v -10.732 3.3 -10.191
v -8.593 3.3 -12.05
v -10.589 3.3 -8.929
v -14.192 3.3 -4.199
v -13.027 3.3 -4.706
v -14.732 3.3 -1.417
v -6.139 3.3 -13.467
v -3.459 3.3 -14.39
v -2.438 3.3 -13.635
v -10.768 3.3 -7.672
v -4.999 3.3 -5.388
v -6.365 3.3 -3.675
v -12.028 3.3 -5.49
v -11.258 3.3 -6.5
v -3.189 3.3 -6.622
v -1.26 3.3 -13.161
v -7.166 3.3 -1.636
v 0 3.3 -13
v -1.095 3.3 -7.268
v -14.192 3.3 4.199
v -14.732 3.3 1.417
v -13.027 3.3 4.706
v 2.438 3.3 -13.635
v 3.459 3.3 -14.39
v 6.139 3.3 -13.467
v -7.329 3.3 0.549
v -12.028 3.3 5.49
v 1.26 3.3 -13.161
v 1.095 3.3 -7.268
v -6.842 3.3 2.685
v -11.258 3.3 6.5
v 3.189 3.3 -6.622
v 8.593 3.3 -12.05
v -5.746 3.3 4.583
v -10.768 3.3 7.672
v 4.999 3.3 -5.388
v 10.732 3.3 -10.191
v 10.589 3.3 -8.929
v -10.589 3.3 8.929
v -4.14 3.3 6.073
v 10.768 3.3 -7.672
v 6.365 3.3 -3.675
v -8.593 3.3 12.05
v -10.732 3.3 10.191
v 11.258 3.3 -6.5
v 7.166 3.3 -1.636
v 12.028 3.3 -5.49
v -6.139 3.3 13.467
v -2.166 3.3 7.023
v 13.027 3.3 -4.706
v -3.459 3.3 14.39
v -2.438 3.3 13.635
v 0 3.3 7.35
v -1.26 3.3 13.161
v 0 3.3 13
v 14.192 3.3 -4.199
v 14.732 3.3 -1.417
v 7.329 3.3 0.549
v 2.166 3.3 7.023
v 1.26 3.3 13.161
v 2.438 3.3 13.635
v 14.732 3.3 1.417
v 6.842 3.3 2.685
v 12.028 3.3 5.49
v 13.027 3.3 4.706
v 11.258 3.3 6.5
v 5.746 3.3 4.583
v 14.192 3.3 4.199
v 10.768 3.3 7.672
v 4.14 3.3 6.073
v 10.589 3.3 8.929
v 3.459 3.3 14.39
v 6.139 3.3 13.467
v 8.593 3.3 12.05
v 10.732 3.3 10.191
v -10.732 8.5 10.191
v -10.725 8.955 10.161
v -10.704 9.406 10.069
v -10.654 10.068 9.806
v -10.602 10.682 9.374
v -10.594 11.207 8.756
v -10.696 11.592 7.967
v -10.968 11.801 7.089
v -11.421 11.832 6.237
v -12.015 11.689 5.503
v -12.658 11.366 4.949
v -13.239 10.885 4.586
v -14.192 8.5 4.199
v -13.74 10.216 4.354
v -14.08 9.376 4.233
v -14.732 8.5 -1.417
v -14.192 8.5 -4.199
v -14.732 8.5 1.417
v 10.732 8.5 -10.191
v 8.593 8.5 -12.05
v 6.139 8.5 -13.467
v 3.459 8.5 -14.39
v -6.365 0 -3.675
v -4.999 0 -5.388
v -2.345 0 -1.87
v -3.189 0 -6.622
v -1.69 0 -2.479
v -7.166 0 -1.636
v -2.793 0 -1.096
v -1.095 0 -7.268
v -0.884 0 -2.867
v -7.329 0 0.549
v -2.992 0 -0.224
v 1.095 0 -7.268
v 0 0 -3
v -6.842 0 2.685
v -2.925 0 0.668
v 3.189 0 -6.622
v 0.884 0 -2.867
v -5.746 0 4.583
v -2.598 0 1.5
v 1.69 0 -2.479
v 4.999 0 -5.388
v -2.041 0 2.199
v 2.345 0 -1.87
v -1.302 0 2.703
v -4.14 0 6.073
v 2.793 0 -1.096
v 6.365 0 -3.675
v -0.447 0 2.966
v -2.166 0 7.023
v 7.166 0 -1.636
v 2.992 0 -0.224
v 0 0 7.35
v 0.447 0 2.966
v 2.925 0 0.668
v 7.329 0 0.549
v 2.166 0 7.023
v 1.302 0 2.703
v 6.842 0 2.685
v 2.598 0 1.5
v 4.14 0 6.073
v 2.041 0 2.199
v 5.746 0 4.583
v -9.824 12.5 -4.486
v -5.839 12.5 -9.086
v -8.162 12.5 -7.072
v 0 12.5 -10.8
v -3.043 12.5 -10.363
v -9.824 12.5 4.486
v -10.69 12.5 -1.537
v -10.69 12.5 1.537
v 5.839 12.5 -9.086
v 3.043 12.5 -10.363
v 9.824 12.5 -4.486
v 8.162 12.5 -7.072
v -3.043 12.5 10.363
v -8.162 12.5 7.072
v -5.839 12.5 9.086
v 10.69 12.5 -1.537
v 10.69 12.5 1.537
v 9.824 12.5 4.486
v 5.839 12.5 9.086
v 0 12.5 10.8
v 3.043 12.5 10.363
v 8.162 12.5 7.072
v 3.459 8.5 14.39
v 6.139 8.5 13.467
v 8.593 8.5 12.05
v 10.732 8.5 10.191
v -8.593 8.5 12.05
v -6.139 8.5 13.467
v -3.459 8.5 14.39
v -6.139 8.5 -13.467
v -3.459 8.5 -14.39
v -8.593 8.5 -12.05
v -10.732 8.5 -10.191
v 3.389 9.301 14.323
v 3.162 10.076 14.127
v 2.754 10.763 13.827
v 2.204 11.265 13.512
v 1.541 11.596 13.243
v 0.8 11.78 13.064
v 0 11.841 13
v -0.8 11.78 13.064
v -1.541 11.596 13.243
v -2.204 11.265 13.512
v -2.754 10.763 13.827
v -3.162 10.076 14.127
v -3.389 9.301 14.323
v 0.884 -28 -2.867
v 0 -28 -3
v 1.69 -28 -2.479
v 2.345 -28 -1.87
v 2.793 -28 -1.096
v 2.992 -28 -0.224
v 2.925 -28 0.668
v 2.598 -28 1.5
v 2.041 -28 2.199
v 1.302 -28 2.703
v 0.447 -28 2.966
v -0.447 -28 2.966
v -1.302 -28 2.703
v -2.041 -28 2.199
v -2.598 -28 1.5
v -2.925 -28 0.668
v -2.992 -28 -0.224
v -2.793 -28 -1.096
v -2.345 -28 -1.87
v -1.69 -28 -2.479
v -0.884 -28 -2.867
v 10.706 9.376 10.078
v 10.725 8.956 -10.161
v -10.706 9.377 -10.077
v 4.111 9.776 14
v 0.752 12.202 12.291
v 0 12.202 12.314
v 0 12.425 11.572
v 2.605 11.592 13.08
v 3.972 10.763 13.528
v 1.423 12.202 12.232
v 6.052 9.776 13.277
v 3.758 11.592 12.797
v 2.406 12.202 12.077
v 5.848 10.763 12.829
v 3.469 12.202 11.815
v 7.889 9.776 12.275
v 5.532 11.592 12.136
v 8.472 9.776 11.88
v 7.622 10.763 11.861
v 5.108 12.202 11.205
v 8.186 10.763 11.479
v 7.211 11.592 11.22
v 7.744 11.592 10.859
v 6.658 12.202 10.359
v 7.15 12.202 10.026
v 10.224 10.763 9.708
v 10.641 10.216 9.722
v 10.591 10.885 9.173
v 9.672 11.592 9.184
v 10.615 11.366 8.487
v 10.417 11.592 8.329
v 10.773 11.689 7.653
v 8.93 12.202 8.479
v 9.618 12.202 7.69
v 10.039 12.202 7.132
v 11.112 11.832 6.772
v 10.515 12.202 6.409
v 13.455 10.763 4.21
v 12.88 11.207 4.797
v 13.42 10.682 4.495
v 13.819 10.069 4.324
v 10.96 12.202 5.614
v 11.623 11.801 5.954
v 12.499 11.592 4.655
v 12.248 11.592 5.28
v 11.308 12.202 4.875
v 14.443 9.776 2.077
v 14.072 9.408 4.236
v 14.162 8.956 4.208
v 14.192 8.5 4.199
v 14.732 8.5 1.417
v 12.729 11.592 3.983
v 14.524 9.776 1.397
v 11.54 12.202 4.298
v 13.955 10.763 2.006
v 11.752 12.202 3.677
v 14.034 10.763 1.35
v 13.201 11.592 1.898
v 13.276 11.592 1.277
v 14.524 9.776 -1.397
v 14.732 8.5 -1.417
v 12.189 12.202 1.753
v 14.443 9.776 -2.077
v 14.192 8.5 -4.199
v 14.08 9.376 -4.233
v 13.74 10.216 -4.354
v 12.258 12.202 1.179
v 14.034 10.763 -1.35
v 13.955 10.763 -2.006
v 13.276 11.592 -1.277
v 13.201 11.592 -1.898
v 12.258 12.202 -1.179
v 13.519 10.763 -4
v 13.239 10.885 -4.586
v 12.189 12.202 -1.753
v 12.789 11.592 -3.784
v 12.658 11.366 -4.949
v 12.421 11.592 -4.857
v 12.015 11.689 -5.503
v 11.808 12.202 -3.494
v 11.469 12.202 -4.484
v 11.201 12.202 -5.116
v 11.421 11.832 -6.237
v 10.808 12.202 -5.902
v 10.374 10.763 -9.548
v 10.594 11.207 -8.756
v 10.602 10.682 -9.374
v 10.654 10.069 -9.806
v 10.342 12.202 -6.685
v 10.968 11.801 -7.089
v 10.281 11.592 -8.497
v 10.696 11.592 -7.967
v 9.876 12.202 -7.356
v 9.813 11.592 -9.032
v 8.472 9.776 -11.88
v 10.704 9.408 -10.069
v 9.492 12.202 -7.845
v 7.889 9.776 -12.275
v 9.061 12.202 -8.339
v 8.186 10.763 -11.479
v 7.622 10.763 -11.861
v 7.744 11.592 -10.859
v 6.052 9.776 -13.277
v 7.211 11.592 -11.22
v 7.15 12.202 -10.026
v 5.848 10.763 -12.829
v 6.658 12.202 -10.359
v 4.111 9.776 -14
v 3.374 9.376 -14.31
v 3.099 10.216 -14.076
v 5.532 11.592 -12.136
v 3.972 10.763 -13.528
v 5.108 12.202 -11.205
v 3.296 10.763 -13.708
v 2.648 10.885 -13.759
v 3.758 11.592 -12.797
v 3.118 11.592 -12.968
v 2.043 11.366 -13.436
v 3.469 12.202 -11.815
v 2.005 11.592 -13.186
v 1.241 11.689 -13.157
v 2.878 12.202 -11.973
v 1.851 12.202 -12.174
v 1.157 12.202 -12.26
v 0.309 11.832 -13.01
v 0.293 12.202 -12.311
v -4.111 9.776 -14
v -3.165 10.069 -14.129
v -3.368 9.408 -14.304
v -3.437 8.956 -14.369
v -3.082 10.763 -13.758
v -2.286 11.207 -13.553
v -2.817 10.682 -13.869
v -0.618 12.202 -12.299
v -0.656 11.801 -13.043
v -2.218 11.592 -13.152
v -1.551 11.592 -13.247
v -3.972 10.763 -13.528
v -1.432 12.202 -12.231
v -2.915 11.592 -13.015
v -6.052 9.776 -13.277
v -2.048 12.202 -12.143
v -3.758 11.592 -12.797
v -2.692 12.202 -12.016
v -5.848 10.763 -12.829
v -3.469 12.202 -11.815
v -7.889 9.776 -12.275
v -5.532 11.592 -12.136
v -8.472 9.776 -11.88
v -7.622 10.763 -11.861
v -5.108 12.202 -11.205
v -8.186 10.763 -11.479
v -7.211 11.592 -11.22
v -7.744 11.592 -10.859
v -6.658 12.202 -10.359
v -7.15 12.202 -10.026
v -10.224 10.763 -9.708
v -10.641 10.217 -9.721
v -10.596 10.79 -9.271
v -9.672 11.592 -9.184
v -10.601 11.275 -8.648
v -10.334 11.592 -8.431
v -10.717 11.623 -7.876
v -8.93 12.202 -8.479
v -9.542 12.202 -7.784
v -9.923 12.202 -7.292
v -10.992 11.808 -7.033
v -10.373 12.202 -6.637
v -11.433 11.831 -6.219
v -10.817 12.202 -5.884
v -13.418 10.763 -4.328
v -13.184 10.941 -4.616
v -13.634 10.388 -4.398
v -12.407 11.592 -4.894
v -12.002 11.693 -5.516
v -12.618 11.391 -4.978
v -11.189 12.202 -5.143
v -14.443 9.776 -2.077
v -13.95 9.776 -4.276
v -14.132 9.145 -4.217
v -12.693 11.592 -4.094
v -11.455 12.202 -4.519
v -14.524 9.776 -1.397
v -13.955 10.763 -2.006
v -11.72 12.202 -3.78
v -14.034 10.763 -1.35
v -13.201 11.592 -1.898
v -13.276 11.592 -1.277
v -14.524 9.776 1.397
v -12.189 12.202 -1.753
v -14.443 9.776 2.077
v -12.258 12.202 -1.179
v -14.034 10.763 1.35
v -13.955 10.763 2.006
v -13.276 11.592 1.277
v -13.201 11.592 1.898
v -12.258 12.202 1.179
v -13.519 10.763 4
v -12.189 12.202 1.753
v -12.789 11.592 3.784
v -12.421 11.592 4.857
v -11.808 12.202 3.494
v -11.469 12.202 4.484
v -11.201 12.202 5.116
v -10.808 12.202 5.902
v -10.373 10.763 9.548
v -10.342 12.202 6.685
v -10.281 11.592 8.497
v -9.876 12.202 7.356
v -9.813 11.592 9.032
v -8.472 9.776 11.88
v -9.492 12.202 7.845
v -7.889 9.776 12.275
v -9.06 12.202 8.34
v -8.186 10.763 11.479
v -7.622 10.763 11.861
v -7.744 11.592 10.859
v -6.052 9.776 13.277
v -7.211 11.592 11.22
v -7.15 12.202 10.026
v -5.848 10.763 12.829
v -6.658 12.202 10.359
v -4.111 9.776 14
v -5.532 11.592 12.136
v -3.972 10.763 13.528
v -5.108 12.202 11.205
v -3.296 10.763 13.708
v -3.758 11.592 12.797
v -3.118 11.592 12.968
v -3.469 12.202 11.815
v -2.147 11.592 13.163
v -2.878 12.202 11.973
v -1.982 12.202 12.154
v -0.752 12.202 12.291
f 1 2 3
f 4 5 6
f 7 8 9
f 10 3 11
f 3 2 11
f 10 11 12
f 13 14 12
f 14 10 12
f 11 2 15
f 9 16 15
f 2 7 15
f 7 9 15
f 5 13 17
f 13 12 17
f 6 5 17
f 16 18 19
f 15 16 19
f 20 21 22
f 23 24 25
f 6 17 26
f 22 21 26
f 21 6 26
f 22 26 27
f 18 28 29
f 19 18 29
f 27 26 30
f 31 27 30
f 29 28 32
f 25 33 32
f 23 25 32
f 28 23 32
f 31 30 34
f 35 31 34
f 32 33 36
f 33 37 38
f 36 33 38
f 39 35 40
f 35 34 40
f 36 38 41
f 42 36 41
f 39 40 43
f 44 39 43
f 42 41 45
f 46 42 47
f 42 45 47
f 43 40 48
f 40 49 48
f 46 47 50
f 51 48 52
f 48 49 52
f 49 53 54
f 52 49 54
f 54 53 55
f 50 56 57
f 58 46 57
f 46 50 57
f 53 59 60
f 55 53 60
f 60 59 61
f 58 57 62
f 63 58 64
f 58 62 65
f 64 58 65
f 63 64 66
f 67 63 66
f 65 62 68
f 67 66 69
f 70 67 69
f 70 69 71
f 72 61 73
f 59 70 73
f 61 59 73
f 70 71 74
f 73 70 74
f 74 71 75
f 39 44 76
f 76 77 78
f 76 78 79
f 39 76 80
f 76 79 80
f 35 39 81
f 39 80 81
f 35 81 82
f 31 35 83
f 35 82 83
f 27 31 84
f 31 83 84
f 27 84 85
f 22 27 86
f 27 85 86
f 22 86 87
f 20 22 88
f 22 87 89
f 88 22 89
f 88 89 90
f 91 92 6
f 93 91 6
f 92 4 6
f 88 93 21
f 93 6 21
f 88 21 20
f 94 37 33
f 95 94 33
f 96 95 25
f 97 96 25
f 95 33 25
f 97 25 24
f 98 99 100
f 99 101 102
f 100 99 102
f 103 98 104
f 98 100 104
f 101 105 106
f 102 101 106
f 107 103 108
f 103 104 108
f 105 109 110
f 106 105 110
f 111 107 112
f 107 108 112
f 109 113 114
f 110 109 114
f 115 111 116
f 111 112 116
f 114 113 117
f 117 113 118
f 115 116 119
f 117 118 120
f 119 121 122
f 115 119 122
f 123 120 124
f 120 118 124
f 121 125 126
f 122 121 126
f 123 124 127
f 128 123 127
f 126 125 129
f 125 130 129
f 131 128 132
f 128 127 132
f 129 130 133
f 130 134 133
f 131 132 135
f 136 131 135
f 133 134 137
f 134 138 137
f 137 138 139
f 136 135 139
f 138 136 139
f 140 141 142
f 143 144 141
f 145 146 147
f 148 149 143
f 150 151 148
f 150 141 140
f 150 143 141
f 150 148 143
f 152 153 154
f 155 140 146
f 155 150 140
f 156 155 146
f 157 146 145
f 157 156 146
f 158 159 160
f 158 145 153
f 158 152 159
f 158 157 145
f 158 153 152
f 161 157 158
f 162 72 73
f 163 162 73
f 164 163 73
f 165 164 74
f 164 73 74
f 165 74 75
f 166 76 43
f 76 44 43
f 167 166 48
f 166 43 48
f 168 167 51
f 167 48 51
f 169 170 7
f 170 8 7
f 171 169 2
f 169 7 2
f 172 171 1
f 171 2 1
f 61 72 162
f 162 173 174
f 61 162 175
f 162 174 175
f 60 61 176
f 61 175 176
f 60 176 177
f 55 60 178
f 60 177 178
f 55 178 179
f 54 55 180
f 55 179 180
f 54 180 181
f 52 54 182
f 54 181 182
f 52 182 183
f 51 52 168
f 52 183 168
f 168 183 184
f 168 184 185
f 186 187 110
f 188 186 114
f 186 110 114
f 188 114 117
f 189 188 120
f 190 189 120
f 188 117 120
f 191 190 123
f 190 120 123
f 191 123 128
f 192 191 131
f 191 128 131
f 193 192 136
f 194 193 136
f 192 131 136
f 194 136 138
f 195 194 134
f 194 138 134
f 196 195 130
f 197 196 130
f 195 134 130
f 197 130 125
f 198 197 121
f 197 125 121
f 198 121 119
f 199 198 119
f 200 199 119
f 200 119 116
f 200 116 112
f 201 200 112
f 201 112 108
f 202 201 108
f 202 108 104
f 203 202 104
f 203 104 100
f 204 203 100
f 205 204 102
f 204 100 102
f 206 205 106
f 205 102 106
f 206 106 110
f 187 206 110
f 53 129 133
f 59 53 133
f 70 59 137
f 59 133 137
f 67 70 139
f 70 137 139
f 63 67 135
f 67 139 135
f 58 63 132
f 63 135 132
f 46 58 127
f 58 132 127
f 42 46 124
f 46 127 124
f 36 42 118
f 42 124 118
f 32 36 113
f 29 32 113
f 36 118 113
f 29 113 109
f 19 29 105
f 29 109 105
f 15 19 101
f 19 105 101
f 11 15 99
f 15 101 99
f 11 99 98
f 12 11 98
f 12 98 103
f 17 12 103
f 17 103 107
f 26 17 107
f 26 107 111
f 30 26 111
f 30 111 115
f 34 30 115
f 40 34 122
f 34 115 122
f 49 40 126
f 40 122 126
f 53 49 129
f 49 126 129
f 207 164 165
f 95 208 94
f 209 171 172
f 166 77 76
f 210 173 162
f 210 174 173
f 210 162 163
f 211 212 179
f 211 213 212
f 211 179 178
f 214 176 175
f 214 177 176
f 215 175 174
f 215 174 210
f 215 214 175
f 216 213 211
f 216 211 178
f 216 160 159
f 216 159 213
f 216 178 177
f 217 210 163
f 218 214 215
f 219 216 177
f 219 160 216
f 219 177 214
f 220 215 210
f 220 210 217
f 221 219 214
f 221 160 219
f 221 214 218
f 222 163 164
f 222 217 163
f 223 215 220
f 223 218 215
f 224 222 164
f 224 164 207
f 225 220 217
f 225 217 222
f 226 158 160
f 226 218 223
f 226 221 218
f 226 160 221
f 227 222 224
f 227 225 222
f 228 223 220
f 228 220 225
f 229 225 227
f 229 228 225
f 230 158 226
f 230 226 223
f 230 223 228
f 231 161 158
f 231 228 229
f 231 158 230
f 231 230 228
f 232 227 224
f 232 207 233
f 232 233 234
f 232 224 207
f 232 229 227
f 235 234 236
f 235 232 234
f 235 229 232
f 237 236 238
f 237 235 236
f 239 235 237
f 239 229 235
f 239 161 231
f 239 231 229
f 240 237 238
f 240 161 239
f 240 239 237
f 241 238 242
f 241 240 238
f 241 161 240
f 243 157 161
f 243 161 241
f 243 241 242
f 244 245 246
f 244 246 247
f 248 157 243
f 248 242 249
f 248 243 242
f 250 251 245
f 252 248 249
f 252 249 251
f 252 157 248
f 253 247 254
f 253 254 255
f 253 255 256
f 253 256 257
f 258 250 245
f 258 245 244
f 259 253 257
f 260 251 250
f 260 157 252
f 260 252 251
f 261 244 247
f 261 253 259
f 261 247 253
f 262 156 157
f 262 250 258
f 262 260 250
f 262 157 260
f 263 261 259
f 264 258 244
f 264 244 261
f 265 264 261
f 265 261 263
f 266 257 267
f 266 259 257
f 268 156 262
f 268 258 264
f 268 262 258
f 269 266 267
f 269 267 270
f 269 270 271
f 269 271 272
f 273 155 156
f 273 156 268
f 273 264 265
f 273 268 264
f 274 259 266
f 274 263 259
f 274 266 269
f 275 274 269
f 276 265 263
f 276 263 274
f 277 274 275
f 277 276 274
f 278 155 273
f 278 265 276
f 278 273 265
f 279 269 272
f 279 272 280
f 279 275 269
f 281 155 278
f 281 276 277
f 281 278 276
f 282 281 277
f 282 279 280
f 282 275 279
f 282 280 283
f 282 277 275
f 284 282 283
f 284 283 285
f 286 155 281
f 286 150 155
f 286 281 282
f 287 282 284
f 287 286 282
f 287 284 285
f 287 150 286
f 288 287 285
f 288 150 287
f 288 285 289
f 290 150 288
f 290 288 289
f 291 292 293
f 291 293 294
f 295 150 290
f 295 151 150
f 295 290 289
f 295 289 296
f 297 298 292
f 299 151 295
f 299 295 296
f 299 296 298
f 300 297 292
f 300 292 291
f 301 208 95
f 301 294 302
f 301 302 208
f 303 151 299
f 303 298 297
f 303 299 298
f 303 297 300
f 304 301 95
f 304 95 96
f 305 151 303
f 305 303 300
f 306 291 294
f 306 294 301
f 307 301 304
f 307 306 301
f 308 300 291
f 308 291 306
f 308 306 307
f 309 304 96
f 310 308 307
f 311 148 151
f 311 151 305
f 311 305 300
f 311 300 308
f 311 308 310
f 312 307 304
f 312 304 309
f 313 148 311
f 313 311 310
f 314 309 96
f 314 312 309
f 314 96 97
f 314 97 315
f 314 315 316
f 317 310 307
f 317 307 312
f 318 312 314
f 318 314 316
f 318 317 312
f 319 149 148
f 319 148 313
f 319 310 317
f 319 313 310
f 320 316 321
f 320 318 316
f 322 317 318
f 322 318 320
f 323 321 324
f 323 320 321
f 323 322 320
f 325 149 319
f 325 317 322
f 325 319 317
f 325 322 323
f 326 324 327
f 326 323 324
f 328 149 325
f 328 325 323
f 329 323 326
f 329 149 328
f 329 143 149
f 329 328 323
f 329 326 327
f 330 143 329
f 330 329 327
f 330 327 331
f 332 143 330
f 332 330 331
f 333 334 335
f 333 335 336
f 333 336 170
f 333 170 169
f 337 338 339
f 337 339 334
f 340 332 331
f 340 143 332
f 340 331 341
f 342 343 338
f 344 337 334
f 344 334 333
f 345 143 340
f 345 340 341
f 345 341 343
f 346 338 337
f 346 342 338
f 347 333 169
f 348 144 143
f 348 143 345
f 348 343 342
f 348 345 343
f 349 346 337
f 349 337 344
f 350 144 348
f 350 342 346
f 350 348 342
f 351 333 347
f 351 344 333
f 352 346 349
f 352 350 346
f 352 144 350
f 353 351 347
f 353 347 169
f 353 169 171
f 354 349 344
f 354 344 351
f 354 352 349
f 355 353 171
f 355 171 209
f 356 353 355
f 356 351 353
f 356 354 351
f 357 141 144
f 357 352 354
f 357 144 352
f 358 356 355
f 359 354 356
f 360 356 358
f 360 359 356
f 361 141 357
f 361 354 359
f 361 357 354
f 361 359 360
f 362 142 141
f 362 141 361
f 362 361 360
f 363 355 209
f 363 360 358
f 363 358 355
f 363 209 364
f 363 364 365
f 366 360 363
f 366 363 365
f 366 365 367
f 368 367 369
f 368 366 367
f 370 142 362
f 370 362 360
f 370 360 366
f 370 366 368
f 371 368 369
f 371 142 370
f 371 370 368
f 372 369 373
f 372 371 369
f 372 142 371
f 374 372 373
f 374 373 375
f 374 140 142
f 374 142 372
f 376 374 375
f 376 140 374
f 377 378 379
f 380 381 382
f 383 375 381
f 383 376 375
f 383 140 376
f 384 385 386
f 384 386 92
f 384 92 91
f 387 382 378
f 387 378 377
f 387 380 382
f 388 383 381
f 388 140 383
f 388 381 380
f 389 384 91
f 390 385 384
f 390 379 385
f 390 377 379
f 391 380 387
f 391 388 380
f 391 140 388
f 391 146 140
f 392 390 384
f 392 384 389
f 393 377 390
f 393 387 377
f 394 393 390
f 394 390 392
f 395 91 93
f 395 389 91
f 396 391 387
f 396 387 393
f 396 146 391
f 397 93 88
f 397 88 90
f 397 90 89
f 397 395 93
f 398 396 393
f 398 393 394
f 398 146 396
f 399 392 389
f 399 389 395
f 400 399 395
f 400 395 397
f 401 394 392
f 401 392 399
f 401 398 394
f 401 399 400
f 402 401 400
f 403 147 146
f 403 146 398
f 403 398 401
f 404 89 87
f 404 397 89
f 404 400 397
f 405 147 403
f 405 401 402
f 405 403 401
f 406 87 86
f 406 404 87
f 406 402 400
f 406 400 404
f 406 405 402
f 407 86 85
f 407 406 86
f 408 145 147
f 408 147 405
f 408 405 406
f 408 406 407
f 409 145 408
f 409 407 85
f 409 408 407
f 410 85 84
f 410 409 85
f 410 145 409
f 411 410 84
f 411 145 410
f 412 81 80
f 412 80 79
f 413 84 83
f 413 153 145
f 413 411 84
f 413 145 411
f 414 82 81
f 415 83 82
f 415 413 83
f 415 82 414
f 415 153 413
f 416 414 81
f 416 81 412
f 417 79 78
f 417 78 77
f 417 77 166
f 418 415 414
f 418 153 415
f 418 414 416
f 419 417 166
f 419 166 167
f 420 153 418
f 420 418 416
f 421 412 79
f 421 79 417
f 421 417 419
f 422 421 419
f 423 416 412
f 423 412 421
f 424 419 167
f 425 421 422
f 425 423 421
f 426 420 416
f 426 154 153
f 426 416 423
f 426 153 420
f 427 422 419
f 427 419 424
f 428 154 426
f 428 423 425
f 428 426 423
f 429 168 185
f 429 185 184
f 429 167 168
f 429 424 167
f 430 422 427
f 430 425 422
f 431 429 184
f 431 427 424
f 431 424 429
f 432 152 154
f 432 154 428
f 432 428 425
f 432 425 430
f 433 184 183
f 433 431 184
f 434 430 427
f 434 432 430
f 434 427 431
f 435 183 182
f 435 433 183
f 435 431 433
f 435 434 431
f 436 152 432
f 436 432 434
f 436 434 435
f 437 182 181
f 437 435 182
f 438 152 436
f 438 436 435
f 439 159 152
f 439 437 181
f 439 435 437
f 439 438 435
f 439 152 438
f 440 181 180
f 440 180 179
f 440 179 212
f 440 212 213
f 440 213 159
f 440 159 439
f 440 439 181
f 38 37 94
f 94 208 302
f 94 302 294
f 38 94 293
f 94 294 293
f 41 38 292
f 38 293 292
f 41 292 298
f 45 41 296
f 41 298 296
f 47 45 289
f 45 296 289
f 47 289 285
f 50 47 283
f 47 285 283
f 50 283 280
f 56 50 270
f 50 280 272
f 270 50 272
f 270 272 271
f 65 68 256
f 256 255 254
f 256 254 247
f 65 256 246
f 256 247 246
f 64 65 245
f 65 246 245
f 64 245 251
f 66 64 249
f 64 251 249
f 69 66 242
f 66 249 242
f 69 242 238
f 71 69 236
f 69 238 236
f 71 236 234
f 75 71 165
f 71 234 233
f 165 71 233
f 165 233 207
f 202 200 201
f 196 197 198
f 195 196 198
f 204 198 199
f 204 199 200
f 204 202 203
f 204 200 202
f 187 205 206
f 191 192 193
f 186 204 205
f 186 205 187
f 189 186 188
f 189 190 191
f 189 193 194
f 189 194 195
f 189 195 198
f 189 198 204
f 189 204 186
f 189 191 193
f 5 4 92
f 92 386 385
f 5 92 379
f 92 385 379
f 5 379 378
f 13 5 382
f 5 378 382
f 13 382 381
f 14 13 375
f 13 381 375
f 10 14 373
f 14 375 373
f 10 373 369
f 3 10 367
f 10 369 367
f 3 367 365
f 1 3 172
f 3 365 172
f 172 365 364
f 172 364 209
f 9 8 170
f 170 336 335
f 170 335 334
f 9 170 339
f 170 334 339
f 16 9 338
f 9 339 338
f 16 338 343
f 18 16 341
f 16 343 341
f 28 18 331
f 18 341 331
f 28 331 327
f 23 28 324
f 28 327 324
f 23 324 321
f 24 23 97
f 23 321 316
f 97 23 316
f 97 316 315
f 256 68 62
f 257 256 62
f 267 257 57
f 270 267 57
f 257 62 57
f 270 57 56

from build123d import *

# Parameters (mm, degrees)
SKETCH_1_R          = 7.35
EXTRUDE_1_DEPTH     = 3.3
SKETCH_2_R          = 3
EXTRUDE_342_DEPTH   = 28
SKETCH_3_R          = 14.8
EXTRUDE_3_DEPTH     = 9.2
FILLET_1_R          = 4
SKETCH_4_R          = 5
CUT_EXTRUDE_1_DEPTH = 10


with BuildPart() as part:
    # Эскиз1 → Бобышка-Вытянуть1 (new body)
    with BuildSketch(Plane(origin=(0, 0, 0), x_dir=(1, 0, 0), z_dir=(0, 1, 0))):
        with Locations(Location((0, 0, 0), (0, 0, 270))):
            Circle(SKETCH_1_R)
    extrude(amount=EXTRUDE_1_DEPTH)

    # Эскиз2 → Extrude 342 (add)
    with BuildSketch(Plane.XZ):
        with Locations(Location((0, 0, 0), (0, 0, 270))):
            Circle(SKETCH_2_R)
    extrude(amount=EXTRUDE_342_DEPTH)

    # Эскиз3 → Бобышка-Вытянуть3 (add)
    with BuildSketch(Plane(origin=(0, 3.3, 0), x_dir=(1, 0, 0), z_dir=(0, 1, 0))):
        with Locations(Location((0, 0, 0), (0, 0, 270))):
            Circle(SKETCH_3_R)
    extrude(amount=EXTRUDE_3_DEPTH)

    # Скругление1
    fillet_1_edges = [part.edges().sort_by_distance(p)[0] for p in [
        (0, 12.5, -14.8),
    ]]
    fillet(fillet_1_edges, radius=FILLET_1_R)

    # Эскиз4 → Вырез-Вытянуть1 (cut)
    with BuildSketch(Plane(origin=(0, 12.5, 0), x_dir=(1, 0, 0), z_dir=(0, 1, 0))):
        with Locations((0, 18)):
            Circle(SKETCH_4_R)
        with Locations((15.588457268, 9)):
            Circle(SKETCH_4_R)
        with Locations((15.588457268, -9)):
            Circle(SKETCH_4_R)
        with Locations((0, -18)):
            Circle(SKETCH_4_R)
        with Locations((-15.588457268, -9)):
            Circle(SKETCH_4_R)
        with Locations((-15.588457268, 9)):
            Circle(SKETCH_4_R)
    extrude(amount=-CUT_EXTRUDE_1_DEPTH, mode=Mode.SUBTRACT)


solid = part.part
